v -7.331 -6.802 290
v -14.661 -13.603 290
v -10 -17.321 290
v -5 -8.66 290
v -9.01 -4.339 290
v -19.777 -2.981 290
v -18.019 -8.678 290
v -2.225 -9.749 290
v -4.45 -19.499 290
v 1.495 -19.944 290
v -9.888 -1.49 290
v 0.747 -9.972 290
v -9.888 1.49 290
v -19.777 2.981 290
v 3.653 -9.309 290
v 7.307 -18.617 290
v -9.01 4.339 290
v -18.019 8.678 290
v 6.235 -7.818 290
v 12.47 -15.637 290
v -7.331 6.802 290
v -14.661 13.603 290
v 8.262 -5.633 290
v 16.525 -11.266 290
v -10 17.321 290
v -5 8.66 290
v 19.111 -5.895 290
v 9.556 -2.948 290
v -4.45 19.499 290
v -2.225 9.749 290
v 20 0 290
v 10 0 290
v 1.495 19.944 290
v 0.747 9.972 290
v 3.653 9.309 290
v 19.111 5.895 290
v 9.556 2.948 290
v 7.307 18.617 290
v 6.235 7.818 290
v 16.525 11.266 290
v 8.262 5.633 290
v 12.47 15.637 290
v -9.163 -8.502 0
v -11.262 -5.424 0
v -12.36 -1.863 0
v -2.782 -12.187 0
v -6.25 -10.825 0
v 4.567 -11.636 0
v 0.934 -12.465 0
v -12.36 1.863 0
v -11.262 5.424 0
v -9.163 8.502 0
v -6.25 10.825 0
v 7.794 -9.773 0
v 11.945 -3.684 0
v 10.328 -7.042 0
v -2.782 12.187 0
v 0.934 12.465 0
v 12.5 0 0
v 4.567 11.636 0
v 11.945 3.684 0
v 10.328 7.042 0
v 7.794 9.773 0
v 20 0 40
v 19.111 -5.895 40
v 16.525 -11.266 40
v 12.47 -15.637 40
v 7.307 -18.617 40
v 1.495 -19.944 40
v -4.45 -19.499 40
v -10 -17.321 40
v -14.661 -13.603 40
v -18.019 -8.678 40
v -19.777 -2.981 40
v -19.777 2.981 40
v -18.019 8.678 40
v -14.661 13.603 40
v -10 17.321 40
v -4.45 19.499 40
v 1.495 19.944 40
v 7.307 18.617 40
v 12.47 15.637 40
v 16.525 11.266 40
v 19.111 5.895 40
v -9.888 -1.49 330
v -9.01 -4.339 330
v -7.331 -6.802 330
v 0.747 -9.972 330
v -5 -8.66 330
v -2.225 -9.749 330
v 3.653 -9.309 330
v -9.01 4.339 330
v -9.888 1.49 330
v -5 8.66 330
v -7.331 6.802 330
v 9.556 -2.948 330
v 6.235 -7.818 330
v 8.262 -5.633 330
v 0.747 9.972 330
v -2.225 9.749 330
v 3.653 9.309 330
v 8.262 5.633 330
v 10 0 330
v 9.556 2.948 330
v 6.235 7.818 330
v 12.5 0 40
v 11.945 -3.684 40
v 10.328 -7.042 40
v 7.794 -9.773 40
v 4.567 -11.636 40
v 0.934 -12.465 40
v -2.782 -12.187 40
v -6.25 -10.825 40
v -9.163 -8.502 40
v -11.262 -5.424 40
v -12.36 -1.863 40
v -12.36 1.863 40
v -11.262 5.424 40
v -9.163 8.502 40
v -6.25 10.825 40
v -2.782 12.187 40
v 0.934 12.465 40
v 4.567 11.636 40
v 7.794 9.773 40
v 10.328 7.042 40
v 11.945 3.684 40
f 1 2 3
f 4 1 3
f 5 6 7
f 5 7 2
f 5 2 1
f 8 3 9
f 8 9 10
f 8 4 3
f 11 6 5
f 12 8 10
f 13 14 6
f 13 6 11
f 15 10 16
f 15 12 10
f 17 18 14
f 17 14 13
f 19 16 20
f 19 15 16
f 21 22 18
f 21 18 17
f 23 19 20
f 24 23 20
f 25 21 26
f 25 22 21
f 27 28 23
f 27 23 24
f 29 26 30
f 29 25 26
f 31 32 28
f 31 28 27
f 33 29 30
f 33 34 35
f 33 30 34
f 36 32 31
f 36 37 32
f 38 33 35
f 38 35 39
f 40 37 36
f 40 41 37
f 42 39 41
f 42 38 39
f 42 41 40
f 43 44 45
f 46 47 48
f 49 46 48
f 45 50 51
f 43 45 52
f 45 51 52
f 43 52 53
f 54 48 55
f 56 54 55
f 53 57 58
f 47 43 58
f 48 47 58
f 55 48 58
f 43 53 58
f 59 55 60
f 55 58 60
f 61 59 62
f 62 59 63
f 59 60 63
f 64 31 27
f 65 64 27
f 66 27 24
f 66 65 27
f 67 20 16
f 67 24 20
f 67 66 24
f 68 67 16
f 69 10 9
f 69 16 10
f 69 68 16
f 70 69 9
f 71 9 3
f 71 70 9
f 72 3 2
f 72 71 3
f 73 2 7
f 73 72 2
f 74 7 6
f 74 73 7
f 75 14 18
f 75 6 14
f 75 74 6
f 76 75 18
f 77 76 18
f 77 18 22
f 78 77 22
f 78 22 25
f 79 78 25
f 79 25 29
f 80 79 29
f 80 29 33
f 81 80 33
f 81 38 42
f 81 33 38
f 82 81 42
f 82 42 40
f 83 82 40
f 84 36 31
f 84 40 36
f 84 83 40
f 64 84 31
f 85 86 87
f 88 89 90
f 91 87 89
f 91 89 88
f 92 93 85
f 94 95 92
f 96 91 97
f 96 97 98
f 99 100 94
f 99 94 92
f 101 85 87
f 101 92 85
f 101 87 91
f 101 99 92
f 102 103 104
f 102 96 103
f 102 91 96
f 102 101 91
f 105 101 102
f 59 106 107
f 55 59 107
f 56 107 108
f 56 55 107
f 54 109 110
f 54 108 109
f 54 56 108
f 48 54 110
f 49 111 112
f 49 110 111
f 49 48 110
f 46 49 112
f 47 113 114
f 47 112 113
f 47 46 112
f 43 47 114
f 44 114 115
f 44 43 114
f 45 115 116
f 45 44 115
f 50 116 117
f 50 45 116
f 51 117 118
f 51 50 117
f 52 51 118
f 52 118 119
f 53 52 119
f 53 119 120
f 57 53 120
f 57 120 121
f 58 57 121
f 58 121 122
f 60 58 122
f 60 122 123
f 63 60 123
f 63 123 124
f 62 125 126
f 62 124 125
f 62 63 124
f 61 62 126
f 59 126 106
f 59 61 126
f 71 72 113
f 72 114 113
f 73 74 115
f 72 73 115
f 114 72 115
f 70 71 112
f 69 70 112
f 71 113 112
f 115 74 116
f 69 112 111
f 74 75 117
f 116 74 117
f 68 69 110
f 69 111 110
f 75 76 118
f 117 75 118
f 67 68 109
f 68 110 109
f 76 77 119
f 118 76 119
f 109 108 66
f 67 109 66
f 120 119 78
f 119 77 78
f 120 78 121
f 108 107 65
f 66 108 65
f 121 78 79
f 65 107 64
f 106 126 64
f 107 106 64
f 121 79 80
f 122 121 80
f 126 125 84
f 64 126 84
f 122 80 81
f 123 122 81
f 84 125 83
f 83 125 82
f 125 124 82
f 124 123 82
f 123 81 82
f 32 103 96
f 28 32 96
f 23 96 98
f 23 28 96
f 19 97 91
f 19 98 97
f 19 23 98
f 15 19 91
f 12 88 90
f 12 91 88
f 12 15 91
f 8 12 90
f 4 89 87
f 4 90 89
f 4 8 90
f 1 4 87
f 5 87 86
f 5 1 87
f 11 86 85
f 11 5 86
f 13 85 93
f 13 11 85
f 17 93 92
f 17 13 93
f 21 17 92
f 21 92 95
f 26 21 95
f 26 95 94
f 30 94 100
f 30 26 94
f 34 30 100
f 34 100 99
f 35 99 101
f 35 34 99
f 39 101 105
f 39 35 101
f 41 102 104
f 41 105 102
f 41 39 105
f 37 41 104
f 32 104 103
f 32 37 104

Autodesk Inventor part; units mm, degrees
ref_plane "YZ Plane" through (0, 0, 0) normal (1, 0, 0) x (0, 1, 0)
ref_plane "XZ Plane" through (0, 0, 0) normal (0, 1, 0) x (-1, 0, 0)
ref_plane "XY Plane" through (0, 0, 0) normal (0, 0, 1) x (1, 0, 0)
sketch "草图1" plane through (0, 0, 0) normal (0, 0, 1) x (1, 0, 0)
  circle A0 centre (0, 0) radius 12.5
  dimension "d0" = 25
extrude "拉伸1" add sketch "草图1" along normal blind 40
sketch "草图2" plane through (0, 0, 40) normal (0, 0, 1) x (1, 0, 0)
  circle A0 centre (0, 0) radius 20 projected
  point P0 (0, 0)
extrude "拉伸2" add sketch "草图2" along normal blind 250
sketch "草图3" plane through (0, 0, 290) normal (0, 0, 1) x (1, 0, 0)
  circle A0 centre (0, 0) radius 10
  dimension "d5" = 20
extrude "拉伸3" add sketch "草图3" along normal blind 40
properties part number "传动轴2"
